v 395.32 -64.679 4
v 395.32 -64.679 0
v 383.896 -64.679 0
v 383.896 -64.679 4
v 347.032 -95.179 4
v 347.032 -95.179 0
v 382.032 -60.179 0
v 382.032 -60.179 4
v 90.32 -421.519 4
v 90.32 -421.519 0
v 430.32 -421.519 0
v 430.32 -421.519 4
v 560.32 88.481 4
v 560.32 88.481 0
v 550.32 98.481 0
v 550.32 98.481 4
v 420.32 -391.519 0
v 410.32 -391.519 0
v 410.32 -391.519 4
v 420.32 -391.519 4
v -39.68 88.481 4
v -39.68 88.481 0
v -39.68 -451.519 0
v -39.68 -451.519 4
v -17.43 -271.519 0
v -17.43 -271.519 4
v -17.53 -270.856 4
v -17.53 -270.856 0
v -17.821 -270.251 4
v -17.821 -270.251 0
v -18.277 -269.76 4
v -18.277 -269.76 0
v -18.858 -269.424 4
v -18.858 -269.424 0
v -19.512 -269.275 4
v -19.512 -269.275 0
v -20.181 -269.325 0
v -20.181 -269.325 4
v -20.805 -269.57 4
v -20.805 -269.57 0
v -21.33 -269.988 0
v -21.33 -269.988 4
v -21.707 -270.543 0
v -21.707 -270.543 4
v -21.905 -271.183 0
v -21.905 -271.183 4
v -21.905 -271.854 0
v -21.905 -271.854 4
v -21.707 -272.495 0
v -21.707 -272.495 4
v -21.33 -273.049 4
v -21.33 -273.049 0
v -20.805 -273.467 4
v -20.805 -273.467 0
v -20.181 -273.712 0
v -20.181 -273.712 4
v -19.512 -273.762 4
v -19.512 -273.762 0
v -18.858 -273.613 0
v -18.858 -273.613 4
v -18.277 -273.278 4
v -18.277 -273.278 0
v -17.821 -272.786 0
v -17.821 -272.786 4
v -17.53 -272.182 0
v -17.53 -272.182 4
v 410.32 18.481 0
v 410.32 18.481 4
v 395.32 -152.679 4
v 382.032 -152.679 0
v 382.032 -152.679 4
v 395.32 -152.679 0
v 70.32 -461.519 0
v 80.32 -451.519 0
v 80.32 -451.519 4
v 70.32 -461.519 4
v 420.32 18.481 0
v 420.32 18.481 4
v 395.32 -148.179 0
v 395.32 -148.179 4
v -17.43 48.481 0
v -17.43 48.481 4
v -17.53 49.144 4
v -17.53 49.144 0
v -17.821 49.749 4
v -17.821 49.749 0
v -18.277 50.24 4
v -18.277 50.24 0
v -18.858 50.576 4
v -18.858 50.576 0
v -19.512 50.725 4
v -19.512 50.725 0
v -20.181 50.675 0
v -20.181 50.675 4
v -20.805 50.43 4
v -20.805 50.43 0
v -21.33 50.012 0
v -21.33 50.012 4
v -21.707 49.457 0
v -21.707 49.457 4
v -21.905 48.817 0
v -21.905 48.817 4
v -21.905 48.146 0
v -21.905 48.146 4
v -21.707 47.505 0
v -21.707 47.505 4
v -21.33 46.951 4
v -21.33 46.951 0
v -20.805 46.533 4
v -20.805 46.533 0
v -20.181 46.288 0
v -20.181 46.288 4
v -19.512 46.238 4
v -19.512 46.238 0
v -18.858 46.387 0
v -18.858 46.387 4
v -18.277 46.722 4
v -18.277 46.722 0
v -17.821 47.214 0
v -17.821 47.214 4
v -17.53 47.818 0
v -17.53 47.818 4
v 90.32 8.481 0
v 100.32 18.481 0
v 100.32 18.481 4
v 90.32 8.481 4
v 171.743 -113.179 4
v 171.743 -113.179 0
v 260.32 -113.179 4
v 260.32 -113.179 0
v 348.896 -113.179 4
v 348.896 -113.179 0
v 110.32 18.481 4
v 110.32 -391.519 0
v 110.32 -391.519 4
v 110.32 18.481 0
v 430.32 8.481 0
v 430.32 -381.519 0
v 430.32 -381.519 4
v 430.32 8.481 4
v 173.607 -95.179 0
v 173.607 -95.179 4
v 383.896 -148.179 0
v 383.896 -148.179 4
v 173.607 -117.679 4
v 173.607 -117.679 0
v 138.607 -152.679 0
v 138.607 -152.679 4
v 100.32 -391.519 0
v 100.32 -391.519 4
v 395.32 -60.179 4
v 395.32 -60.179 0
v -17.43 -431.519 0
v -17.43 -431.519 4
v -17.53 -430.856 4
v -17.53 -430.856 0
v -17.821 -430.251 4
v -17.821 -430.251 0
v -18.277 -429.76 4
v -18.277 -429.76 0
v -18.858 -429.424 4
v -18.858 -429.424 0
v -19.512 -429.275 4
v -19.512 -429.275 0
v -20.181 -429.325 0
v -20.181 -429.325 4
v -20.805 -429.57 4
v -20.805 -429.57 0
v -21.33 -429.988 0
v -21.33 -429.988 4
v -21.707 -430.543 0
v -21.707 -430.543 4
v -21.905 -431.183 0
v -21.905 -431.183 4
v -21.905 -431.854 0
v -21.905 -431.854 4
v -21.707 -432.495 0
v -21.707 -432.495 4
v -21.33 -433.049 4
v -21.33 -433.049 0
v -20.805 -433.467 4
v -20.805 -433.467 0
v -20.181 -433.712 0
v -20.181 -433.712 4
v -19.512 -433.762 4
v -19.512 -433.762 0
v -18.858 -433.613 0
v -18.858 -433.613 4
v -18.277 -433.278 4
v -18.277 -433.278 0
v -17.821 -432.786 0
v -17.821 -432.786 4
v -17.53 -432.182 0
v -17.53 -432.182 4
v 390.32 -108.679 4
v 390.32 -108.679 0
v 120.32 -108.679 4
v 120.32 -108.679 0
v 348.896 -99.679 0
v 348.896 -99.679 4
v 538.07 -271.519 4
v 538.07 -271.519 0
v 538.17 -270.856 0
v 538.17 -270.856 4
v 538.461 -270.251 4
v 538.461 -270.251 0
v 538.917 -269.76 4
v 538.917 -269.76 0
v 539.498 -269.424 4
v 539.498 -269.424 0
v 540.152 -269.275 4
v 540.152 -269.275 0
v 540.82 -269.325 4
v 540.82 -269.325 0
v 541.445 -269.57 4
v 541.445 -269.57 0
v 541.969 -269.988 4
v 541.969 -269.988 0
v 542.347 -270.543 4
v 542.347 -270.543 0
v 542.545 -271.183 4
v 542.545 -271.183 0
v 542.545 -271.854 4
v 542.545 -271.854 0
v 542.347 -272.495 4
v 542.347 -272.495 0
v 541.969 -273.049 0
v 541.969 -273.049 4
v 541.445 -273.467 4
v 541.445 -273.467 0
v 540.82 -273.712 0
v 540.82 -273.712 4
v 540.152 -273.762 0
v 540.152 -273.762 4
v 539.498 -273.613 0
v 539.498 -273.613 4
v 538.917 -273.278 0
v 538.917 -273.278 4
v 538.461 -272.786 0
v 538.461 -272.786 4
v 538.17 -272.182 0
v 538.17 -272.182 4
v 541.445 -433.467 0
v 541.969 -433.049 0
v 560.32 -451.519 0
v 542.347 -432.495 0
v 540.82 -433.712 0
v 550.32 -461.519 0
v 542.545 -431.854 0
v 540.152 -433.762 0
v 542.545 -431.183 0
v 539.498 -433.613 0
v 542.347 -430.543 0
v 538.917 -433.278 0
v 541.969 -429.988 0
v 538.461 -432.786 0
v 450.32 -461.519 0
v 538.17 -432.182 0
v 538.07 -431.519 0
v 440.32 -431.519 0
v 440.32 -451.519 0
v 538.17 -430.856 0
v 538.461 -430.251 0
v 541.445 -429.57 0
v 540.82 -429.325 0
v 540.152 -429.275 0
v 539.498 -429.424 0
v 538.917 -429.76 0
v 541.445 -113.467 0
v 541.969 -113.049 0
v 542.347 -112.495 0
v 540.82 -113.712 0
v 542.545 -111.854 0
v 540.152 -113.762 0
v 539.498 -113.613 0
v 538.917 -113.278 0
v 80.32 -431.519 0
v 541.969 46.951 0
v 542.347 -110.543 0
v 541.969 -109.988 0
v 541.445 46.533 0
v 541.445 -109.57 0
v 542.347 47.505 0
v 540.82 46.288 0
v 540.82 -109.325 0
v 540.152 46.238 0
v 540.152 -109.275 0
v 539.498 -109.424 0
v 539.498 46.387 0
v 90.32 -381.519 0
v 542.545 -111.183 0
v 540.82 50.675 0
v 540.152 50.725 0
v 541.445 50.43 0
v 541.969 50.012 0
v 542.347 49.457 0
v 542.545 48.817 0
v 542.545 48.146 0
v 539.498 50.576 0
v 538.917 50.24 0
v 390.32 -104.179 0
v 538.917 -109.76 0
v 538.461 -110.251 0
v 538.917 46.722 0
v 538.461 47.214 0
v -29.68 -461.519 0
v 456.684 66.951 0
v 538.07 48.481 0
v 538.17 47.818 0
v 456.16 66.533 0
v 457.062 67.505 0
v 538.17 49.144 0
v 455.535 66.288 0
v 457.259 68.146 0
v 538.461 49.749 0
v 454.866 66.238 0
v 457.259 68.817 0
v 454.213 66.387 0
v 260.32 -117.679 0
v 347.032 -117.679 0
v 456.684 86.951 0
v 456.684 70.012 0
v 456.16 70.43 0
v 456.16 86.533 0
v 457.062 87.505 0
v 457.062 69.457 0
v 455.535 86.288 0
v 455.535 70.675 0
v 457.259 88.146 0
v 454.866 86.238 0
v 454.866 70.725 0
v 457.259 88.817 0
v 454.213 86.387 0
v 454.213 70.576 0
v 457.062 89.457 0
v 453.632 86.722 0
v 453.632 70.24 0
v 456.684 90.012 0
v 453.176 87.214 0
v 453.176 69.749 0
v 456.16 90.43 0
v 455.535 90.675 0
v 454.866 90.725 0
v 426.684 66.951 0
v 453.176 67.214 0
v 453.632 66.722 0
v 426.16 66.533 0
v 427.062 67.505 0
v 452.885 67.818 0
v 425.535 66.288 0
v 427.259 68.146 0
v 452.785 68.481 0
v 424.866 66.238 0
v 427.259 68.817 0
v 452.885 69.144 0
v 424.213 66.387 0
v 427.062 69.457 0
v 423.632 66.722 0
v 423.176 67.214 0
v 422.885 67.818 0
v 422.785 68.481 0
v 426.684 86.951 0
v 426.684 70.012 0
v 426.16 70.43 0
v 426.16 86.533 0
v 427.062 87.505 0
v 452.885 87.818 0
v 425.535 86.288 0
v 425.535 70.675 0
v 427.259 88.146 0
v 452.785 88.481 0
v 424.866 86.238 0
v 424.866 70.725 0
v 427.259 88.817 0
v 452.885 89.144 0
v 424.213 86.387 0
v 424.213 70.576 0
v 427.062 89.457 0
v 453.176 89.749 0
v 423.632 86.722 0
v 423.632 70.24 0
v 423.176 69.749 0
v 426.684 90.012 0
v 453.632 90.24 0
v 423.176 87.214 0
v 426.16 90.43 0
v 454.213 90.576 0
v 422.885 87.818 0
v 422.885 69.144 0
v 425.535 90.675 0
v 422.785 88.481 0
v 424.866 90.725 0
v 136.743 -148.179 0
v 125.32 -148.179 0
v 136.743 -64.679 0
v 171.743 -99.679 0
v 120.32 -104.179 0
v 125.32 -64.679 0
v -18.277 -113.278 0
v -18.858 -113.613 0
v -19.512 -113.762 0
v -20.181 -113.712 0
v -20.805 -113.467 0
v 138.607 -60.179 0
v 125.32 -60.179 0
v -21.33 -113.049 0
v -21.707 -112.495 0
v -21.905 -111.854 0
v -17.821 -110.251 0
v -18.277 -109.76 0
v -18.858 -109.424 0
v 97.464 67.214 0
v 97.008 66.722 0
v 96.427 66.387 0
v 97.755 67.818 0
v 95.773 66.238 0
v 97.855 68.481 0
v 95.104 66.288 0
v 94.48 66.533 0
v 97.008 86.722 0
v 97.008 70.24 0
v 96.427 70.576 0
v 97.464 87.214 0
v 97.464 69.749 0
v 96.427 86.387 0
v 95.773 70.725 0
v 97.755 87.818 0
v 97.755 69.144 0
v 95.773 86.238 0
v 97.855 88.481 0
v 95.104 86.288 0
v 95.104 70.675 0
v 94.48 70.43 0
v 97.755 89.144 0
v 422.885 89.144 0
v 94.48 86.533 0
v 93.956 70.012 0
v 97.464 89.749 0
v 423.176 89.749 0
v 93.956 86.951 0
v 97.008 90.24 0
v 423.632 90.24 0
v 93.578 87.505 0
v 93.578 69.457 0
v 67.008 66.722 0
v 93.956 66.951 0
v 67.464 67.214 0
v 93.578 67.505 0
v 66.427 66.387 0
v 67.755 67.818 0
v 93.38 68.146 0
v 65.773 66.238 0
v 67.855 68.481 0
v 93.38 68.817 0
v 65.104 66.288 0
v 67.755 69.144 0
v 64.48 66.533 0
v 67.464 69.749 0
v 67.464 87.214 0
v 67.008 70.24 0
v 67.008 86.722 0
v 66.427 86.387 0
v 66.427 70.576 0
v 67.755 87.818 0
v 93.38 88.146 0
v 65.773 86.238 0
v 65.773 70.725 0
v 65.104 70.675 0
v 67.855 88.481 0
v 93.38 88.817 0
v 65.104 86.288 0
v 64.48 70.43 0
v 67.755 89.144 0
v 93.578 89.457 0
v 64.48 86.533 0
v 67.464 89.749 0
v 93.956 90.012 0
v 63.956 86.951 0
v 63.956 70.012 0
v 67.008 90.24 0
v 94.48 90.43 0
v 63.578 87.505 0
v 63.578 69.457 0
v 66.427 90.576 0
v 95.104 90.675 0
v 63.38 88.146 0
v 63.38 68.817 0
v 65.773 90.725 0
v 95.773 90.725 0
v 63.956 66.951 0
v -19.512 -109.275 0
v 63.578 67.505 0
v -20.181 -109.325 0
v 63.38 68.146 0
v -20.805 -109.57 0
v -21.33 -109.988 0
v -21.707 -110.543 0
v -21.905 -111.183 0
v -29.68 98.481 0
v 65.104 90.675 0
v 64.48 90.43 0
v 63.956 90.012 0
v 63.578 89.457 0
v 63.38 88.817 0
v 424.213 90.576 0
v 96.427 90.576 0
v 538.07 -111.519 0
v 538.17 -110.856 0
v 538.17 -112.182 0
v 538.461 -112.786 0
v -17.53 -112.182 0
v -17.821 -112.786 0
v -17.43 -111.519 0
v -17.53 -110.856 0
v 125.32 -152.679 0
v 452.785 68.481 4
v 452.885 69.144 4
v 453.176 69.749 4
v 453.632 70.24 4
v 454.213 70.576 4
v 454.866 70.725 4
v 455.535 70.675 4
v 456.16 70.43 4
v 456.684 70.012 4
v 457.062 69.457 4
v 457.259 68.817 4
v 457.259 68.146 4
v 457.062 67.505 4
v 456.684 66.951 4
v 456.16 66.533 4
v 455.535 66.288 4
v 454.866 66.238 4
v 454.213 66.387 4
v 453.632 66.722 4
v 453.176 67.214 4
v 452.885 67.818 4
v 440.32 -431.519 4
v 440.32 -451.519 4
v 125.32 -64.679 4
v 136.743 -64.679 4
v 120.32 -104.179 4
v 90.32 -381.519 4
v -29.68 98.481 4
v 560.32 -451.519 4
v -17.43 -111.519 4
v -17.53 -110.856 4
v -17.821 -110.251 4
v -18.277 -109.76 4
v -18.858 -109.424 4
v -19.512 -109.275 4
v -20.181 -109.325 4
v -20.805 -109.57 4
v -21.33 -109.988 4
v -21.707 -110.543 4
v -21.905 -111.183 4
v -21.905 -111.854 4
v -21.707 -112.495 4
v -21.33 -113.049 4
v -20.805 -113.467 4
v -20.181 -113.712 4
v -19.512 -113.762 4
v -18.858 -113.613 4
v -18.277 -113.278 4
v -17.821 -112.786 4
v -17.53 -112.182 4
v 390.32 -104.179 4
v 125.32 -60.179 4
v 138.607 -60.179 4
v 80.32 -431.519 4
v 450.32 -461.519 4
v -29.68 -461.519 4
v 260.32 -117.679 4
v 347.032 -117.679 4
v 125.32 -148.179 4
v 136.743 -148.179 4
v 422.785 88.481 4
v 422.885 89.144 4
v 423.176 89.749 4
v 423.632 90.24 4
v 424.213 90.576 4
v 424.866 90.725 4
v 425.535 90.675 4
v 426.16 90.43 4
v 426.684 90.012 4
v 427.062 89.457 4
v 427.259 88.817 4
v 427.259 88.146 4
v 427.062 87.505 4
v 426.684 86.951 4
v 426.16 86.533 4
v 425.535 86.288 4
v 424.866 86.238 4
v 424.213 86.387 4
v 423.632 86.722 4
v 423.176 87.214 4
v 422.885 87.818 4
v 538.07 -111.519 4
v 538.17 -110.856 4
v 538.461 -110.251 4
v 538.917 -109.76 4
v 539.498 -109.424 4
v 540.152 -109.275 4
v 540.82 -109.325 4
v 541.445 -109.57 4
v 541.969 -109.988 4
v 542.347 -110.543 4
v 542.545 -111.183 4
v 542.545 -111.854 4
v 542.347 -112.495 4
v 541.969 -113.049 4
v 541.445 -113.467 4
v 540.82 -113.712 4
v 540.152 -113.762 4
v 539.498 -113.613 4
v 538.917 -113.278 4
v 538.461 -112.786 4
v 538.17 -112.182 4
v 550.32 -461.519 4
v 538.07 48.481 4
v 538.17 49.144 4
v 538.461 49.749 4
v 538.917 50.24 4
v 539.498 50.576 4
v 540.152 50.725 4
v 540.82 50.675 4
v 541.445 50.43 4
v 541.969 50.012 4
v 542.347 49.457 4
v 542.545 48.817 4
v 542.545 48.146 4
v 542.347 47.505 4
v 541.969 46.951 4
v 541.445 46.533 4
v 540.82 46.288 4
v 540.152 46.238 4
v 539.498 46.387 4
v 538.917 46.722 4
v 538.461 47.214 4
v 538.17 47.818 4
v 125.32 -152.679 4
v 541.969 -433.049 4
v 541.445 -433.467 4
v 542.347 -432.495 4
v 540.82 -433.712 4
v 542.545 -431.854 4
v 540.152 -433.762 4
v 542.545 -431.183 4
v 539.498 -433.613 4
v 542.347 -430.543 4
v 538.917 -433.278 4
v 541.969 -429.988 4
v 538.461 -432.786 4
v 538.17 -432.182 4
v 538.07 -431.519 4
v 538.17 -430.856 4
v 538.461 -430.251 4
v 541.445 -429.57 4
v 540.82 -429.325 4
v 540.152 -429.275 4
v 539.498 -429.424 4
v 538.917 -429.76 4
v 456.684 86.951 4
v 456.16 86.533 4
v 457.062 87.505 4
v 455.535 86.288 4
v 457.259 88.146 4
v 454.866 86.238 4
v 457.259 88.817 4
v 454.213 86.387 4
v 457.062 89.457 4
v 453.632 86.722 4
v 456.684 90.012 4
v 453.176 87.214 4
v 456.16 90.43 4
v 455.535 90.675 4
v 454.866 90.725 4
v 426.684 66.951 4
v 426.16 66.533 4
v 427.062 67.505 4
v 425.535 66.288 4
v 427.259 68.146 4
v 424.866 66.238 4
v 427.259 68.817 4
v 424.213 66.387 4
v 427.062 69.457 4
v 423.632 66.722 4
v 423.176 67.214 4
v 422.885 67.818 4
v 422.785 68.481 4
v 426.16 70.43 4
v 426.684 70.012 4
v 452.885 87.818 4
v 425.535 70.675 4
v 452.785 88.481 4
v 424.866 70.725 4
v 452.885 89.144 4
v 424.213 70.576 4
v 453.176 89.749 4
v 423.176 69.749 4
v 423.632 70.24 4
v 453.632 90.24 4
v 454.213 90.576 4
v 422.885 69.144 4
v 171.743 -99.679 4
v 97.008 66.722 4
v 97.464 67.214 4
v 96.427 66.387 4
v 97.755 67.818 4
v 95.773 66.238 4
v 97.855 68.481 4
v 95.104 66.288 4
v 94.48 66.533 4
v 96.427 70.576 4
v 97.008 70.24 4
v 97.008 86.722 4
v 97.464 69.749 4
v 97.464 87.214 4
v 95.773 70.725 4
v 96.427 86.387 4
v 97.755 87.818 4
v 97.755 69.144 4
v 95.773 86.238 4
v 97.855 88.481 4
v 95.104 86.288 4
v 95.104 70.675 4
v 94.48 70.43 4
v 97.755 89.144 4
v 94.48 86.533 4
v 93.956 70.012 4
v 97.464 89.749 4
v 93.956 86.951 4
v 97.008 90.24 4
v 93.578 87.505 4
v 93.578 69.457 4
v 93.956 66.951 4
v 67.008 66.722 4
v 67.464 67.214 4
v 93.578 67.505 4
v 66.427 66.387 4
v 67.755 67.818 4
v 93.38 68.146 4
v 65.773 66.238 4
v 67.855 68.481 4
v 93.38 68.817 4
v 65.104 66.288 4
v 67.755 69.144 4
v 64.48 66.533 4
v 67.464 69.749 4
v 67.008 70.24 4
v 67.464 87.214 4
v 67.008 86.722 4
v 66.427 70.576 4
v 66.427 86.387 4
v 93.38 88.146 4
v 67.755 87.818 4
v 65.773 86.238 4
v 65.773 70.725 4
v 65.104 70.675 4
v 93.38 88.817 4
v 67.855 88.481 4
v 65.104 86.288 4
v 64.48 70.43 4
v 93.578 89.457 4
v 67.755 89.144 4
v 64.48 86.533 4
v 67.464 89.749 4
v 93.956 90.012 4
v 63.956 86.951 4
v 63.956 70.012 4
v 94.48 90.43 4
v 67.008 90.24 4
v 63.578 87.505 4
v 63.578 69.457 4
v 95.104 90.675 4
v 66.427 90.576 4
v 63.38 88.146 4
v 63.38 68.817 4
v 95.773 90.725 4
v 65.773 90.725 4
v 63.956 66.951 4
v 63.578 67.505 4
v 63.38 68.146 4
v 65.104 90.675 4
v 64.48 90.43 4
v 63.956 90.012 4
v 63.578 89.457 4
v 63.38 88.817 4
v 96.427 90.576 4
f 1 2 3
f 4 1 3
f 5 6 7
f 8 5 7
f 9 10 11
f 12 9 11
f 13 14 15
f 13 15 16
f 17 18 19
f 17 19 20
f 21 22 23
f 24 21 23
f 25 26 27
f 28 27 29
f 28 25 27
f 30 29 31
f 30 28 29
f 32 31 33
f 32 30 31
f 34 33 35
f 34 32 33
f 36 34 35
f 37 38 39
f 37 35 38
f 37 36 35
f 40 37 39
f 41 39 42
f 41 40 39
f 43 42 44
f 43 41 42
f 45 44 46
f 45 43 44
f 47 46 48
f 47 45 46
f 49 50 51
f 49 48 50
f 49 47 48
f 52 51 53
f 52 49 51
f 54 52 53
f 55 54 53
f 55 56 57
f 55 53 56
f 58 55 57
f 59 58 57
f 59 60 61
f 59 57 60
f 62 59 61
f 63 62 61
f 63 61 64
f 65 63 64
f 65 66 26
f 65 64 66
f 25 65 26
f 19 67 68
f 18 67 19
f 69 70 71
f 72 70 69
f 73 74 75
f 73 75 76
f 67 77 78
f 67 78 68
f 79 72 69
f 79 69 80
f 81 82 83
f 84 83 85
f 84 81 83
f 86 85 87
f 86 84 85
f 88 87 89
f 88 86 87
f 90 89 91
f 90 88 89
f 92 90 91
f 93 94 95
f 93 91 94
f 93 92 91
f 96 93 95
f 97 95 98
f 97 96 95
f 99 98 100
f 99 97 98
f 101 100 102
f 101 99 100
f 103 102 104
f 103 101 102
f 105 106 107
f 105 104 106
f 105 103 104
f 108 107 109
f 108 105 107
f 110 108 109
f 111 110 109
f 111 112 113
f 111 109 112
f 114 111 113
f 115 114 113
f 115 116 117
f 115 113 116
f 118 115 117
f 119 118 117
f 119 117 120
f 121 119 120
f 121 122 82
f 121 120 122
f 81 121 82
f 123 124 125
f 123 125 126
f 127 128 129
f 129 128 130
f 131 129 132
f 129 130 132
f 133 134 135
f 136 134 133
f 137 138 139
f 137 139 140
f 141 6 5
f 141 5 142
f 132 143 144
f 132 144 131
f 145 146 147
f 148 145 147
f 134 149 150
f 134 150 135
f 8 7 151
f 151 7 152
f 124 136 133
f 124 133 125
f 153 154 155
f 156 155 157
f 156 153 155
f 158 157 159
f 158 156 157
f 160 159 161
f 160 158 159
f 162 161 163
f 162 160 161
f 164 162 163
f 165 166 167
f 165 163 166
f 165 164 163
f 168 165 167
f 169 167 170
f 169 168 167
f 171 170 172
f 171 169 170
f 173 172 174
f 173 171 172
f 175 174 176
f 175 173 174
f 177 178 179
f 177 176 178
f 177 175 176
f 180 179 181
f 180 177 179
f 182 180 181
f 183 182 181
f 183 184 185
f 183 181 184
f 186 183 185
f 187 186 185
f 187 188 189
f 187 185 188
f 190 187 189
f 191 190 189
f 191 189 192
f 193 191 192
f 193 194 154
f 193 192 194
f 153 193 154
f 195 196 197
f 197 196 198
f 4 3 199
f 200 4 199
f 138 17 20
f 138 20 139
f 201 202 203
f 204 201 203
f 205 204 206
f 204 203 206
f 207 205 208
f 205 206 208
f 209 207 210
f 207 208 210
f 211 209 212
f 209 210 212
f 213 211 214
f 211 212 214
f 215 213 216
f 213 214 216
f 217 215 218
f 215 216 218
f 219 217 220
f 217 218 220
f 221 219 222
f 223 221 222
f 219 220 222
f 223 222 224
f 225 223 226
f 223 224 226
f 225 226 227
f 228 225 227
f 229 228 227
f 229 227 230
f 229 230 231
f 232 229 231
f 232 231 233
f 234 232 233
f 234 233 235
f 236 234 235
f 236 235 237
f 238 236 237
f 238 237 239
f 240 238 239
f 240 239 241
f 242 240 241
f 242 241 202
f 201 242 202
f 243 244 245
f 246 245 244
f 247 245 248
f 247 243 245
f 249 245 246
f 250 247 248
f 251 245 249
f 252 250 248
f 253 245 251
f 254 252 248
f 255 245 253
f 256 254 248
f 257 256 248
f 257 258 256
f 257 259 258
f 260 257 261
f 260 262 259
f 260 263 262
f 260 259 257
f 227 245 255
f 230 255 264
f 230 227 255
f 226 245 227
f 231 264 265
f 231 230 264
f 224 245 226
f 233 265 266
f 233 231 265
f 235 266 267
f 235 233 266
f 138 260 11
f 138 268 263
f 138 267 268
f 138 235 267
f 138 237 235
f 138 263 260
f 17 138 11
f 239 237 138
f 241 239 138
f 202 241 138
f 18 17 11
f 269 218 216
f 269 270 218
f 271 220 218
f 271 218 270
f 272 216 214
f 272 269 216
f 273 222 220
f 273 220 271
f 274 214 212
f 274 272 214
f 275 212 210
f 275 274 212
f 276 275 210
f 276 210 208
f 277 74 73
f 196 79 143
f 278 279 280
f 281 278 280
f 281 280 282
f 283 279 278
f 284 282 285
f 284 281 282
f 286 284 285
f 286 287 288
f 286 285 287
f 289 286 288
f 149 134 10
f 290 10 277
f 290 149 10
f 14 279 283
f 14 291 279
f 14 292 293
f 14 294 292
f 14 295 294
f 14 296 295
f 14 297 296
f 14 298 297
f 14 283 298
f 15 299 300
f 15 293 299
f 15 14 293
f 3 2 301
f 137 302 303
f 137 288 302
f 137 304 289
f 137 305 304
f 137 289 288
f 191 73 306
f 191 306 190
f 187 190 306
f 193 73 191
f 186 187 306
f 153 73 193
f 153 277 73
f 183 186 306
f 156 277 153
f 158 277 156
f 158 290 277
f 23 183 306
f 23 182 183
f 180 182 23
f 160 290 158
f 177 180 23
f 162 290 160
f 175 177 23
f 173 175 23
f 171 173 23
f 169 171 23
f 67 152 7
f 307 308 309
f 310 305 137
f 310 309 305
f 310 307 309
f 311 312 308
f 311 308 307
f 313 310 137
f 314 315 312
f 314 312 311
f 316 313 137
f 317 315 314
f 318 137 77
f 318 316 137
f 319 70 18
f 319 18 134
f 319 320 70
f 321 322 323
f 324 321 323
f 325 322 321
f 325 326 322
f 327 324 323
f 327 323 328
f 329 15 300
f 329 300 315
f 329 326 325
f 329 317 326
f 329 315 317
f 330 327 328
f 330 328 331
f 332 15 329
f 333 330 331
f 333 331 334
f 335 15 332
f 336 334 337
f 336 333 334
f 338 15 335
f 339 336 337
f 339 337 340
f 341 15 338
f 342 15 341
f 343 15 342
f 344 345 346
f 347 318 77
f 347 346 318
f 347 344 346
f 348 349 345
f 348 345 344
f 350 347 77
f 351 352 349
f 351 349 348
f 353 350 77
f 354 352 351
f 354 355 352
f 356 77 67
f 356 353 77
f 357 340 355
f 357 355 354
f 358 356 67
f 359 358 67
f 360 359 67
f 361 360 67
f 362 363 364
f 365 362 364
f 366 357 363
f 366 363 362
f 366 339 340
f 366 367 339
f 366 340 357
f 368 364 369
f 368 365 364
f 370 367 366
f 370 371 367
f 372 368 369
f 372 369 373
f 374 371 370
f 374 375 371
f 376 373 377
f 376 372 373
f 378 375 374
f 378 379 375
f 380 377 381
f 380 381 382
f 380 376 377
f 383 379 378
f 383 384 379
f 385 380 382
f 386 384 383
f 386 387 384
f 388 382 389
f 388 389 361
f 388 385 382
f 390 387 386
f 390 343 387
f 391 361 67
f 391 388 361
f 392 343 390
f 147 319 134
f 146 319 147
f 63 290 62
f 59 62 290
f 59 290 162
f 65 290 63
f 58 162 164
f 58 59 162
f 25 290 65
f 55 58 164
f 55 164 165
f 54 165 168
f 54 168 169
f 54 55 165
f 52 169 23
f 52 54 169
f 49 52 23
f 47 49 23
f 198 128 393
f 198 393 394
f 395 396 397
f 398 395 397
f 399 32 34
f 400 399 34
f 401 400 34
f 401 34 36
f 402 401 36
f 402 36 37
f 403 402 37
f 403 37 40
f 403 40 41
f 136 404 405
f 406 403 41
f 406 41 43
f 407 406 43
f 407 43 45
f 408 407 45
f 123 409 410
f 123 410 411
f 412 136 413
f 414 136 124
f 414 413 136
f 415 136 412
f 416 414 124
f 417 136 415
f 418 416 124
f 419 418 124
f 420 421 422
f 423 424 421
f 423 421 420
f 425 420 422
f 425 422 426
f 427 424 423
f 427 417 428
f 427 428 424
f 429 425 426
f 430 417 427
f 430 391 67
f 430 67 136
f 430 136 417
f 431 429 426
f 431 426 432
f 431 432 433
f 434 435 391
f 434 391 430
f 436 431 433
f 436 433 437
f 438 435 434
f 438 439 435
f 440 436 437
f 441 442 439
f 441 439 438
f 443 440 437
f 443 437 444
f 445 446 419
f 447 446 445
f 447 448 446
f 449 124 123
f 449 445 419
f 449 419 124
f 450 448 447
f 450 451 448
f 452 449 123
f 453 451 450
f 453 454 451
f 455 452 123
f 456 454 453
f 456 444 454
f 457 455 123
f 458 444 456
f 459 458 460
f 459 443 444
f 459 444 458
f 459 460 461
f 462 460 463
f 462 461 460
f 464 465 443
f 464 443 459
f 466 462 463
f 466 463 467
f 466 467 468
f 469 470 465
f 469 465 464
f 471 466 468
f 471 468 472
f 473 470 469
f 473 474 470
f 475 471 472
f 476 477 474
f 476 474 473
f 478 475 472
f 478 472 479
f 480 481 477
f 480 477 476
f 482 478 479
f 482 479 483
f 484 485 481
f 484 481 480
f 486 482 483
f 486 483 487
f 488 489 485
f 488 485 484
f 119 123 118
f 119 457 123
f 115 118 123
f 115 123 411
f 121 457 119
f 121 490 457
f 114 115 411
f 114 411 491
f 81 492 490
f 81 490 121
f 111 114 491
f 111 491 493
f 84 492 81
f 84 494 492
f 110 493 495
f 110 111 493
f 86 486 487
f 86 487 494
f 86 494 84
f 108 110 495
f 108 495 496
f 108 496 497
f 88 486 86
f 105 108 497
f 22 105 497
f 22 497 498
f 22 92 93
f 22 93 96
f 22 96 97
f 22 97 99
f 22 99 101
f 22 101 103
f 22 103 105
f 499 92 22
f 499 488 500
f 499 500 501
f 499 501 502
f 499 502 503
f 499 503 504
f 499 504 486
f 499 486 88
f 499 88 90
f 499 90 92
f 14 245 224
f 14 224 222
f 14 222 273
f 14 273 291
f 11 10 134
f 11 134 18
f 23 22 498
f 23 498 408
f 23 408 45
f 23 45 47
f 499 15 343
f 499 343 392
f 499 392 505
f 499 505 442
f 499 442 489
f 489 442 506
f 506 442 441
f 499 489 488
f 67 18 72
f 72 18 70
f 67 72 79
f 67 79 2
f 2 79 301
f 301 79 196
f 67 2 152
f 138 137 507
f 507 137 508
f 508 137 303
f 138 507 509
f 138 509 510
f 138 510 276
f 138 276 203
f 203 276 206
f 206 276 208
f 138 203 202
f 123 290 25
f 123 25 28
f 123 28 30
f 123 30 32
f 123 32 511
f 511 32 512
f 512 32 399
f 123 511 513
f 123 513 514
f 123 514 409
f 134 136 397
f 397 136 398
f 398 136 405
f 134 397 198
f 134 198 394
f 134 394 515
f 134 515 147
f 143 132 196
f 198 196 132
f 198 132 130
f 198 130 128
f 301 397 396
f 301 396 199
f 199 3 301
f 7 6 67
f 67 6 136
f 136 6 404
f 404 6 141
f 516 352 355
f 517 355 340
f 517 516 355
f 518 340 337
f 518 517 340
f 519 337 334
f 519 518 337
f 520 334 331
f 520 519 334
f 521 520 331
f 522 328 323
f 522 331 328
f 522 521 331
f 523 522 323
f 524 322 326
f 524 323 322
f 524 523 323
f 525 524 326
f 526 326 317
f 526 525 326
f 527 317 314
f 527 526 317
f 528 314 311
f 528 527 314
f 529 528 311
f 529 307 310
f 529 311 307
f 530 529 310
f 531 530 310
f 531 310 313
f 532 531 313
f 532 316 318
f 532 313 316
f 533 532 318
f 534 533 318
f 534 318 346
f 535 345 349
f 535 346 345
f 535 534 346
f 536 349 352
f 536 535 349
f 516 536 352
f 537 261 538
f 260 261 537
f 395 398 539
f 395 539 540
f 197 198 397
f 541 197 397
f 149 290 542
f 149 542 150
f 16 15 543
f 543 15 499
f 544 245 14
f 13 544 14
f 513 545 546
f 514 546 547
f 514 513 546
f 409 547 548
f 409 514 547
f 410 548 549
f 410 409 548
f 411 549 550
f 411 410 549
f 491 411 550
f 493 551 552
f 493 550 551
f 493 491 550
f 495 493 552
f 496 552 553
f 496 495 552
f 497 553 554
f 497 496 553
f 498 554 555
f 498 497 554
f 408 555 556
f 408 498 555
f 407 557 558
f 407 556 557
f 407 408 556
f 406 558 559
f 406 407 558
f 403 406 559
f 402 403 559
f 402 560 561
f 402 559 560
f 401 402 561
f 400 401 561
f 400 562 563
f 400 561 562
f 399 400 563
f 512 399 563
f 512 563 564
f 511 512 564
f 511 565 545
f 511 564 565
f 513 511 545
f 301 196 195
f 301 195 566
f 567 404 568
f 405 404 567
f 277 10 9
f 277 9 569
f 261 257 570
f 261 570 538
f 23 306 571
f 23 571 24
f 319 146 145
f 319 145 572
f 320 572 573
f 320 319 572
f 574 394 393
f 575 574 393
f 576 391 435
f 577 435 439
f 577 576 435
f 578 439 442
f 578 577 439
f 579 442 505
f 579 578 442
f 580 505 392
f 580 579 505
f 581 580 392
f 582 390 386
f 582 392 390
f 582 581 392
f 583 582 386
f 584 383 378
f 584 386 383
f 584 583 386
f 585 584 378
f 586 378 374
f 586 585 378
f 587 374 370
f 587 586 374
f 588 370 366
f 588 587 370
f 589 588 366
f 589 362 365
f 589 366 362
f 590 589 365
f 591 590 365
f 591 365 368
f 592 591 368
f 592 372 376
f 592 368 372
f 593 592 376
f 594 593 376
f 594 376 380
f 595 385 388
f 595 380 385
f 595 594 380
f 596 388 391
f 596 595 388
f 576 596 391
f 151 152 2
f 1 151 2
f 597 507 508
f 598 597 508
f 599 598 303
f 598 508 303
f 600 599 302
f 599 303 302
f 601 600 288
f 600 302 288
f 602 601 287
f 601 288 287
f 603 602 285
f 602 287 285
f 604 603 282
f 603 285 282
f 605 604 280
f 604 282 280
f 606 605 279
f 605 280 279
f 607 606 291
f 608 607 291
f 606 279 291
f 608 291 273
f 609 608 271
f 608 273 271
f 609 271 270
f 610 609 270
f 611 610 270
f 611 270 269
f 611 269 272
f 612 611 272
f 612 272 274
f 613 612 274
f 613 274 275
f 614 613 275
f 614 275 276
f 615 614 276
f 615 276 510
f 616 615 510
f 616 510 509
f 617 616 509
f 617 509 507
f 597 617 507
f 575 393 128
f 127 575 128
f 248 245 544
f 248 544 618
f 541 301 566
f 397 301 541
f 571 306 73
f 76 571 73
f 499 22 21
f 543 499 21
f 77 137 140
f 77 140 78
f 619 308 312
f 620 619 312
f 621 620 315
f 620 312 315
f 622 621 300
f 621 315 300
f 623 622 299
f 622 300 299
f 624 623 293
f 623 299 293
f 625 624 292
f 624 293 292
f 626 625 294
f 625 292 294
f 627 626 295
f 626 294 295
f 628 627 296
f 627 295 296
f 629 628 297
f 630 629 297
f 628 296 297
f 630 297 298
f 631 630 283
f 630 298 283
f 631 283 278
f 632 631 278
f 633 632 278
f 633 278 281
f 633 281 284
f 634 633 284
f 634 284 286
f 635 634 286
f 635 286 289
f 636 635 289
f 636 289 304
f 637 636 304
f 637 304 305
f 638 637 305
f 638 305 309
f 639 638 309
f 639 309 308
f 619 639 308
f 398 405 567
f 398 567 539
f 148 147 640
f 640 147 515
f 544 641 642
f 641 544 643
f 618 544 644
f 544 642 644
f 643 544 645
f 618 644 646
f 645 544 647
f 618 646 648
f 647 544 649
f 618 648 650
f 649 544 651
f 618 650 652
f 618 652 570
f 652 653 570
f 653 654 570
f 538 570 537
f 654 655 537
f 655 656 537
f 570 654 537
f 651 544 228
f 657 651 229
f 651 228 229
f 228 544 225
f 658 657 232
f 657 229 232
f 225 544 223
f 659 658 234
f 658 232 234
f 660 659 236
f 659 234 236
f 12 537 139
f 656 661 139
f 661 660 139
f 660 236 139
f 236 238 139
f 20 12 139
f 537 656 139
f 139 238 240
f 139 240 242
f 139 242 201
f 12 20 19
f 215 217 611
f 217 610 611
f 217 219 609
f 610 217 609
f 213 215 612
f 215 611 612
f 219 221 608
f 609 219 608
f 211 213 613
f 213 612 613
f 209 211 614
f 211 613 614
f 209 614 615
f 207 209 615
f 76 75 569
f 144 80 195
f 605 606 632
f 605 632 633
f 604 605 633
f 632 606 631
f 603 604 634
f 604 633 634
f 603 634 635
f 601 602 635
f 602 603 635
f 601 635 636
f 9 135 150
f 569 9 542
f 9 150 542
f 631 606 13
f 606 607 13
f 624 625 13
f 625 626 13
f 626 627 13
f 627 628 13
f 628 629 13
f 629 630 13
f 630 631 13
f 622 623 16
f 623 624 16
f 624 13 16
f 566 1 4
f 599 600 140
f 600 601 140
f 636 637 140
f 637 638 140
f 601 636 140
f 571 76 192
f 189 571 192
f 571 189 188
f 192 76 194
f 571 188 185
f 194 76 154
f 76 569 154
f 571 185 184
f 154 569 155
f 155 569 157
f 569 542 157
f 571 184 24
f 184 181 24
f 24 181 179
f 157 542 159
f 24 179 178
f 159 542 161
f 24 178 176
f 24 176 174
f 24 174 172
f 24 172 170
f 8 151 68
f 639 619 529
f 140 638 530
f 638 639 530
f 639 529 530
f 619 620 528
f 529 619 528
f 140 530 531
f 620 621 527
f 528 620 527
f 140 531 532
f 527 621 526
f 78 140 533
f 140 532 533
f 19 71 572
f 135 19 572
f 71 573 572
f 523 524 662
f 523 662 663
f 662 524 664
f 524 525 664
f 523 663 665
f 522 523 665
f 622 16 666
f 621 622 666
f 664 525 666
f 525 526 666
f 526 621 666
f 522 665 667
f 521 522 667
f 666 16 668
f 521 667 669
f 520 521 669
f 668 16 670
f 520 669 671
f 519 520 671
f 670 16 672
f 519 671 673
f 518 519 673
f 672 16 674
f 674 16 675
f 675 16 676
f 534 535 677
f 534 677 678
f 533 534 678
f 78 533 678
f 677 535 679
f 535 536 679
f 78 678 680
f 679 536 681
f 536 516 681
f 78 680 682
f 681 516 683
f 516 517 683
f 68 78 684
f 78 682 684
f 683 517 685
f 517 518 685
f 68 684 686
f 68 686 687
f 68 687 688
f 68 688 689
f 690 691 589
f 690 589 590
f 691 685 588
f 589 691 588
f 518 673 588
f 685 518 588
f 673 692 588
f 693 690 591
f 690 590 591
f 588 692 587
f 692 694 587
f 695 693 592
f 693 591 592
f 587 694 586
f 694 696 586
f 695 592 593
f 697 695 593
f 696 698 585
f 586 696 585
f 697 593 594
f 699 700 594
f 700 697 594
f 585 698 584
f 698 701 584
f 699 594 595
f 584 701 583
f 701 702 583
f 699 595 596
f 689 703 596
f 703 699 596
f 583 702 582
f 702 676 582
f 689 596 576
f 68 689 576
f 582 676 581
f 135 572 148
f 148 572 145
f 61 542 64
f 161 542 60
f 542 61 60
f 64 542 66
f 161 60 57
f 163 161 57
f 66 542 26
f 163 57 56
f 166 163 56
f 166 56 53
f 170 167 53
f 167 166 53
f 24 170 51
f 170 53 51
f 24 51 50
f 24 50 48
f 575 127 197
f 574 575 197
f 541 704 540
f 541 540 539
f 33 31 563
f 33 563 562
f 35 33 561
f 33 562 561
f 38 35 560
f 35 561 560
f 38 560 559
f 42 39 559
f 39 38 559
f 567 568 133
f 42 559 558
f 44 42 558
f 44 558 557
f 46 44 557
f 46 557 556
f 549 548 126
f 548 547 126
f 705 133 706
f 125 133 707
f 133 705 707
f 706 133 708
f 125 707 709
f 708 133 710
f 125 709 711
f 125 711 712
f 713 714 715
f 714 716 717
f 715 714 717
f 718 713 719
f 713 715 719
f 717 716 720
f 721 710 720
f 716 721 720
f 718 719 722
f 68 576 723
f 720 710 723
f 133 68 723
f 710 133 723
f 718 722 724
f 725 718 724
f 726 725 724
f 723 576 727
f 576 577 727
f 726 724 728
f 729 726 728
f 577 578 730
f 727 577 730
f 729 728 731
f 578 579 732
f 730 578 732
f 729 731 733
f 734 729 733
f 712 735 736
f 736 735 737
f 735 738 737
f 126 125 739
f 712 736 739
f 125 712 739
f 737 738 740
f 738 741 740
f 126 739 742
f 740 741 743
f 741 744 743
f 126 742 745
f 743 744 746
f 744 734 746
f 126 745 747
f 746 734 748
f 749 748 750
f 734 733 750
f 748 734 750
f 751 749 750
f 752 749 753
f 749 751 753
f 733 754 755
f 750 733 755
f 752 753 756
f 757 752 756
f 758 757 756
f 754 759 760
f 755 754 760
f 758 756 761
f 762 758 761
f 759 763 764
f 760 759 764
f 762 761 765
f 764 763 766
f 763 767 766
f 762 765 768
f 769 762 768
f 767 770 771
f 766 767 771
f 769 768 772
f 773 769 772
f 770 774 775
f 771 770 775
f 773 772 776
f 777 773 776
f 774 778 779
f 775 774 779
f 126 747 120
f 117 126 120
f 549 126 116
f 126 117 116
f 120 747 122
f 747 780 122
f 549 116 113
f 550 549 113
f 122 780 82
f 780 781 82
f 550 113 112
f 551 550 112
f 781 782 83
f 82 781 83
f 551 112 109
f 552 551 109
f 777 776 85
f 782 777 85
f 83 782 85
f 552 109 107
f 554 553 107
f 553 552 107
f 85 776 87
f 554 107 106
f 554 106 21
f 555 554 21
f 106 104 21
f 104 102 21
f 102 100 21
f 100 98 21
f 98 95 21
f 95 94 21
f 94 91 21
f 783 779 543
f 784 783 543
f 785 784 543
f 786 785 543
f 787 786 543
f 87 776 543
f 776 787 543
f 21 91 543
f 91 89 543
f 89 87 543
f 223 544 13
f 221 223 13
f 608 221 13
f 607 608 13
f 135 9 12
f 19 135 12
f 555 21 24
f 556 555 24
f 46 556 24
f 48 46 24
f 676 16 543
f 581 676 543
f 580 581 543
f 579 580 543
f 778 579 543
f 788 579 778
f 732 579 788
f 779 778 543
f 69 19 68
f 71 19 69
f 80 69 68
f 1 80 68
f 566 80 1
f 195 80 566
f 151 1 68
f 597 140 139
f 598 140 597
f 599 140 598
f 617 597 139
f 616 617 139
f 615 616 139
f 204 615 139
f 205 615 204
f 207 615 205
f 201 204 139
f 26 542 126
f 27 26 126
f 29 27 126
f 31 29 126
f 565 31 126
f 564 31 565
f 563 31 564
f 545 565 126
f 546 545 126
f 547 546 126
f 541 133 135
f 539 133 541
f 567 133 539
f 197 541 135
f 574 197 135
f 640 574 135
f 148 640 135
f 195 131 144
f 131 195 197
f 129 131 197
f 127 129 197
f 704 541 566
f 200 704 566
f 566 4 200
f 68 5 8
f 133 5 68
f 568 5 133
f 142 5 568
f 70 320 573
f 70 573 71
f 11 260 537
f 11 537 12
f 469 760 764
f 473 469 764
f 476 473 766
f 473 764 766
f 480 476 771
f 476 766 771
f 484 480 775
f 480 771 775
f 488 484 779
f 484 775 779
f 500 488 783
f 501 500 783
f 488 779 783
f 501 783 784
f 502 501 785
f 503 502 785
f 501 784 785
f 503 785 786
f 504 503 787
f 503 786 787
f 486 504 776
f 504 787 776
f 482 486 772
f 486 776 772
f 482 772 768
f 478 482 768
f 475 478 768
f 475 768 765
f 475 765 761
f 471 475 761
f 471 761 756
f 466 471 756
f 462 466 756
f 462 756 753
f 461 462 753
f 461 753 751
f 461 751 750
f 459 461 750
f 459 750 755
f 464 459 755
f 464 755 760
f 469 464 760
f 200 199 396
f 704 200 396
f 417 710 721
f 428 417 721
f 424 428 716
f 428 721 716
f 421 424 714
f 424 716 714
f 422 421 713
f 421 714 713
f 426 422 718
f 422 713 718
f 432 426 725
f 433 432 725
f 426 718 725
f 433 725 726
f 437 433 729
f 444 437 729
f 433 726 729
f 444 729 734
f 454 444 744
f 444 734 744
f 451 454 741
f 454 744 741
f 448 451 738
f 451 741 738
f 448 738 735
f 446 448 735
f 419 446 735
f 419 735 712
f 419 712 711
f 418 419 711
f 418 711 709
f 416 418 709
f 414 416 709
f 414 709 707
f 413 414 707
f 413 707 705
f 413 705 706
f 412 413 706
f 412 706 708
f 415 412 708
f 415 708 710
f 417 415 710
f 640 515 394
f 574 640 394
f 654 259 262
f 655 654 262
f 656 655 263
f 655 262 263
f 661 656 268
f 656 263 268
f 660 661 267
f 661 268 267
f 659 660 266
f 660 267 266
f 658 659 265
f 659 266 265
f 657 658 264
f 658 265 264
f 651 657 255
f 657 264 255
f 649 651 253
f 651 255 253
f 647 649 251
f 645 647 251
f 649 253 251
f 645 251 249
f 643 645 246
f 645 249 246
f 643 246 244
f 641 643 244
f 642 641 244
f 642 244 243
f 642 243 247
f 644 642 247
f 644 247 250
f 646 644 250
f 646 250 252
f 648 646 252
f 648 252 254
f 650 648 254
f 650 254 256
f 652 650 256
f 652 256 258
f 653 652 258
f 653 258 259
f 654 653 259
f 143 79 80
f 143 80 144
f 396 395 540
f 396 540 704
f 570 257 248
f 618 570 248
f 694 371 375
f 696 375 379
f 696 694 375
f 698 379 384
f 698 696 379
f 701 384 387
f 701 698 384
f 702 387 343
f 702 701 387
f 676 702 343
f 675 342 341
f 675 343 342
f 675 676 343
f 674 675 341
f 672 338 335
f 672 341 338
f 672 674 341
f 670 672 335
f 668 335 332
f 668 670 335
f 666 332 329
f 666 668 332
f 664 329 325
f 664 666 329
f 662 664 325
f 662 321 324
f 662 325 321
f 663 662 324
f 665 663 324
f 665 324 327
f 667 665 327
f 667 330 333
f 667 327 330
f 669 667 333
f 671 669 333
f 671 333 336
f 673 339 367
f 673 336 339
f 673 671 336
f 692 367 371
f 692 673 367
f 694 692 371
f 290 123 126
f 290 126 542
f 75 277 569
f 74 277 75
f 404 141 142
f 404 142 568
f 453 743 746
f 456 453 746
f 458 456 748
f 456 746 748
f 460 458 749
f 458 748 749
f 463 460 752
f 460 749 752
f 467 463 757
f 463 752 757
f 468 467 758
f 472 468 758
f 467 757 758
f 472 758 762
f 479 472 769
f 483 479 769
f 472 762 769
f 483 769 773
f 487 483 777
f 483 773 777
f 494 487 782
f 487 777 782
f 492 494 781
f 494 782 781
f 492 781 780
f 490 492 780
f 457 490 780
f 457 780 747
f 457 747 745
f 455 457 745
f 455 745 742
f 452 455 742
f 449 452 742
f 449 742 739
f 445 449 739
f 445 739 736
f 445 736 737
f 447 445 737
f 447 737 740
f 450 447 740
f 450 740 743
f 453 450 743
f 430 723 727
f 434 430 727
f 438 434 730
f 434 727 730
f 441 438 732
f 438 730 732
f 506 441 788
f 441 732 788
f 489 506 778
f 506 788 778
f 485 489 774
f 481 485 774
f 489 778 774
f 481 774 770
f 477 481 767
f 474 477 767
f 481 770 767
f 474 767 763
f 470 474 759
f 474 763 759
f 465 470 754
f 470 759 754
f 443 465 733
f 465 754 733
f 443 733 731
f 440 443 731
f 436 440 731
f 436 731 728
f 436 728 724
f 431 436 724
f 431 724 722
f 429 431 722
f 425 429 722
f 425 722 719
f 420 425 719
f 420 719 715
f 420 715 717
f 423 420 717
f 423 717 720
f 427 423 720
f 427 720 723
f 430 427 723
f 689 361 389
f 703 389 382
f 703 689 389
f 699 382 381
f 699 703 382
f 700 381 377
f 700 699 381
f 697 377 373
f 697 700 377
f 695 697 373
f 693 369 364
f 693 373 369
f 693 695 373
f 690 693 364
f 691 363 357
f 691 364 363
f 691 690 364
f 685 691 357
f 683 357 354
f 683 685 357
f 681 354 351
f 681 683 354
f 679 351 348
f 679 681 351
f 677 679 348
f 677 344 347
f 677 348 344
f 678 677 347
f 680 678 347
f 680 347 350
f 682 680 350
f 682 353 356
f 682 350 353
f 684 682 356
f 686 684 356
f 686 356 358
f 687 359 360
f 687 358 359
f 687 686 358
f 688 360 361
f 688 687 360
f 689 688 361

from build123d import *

# Parameters (mm, degrees)
BOSS_EXTRUDE1_DEPTH  = 4
CUT_EXTRUDE2_DEPTH   = 10
SKETCH4_W            = 270
SKETCH4_H            = 4.5
CUT_EXTRUDE5_DEPTH   = 10
CUT_EXTRUDE6_DEPTH   = 10
MIRROR9_COPY_1_DEPTH = 10
CHAMFER1_SIZE        = 10
SKETCH6_R            = 2.25
CUT_EXTRUDE7_DEPTH   = 10
SKETCH7_R            = 2.25
CUT_EXTRUDE8_DEPTH   = 10


with BuildPart() as part:
    # Sketch1 → Boss-Extrude1 (new body)
    with BuildSketch(Plane.XY):
        Polygon((440.319741737, -451.518776284), (440.319741737, -431.518776284), (430.319741737, -421.518776284), (310.319741737, -421.518776284), (210.319741737, -421.518776284), (90.319741737, -421.518776284), (80.319741737, -431.518776284), (80.319741737, -451.518776284), (70.319741737, -461.518776284), (2.319741737, -461.518776284), (-29.680258263, -461.518776284), (-39.680258263, -451.518776284), (-39.680258263, -421.518776284), (-39.680258263, -5.004819249), (-39.680258263, 98.481223716), (0.319741737, 98.481223716), (540.319741737, 98.481223716), (560.319741737, 98.481223716), (560.319741737, -5.004819249), (560.319741737, -420.004819249), (560.319741737, -451.518776284), (550.319741737, -461.518776284), (540.319741737, -461.518776284), (450.319741737, -461.518776284), align=None)
    extrude(amount=BOSS_EXTRUDE1_DEPTH)

    # Sketch3 → Cut-Extrude2 (cut)
    with BuildSketch(Plane(origin=(0, 0, 0), x_dir=(-1, 0, 0), z_dir=(0, 0, -1))):
        Polygon((-410.319741737, -391.518776284), (-420.319741737, -391.518776284), (-430.319741737, -381.518776284), (-430.319741737, 8.481223716), (-420.319741737, 18.481223716), (-410.319741737, 18.481223716), align=None)
        Polygon((-100.319741737, 18.481223716), (-90.319741737, 8.481223716), (-90.319741737, -381.518776284), (-100.319741737, -391.518776284), (-110.319741737, -391.518776284), (-110.319741737, 18.481223716), align=None)
    extrude(amount=-CUT_EXTRUDE2_DEPTH, mode=Mode.SUBTRACT)

    # Sketch4 → Cut-Extrude5 (cut)
    with BuildSketch(Plane(origin=(0, 0, 0), x_dir=(-1, 0, 0), z_dir=(0, 0, -1))):
        with Locations((-255.319741737, -106.429112329)):
            Rectangle(SKETCH4_W, SKETCH4_H)
    extrude(amount=-CUT_EXTRUDE5_DEPTH, mode=Mode.SUBTRACT)

    # Sketch5 → Cut-Extrude6 (cut)
    with BuildSketch(Plane(origin=(0, 0, 0), x_dir=(-1, 0, 0), z_dir=(0, 0, -1))):
        Polygon((-171.743467553, -99.679112329), (-260.319741737, -99.679112329), (-260.319741737, -95.179112329), (-173.607428584, -95.179112329), (-138.607428584, -60.179112329), (-125.319741737, -60.179112329), (-125.319741737, -64.679112329), (-136.743467553, -64.679112329), align=None)
    cut_extrude6 = extrude(amount=-CUT_EXTRUDE6_DEPTH, mode=Mode.SUBTRACT)

    # Mirror3: Cut-Extrude6 across plane
    add(cut_extrude6.mirror(Plane(origin=(260.319741737, -99.679112329, 10), x_dir=(0, 0, 1), z_dir=(1, 0, 0))), mode=Mode.SUBTRACT)

    # Mirror9: Cut-Extrude6 across plane
    add(cut_extrude6.mirror(Plane(origin=(0, -106.429112329, 0), x_dir=(0, 0, 1), z_dir=(0, -1, 0))), mode=Mode.SUBTRACT)

    # Mirror9 copy 1 sketch → Mirror9 copy 1 (cut)
    with BuildSketch(Plane(origin=(520.639483474, -212.858224657, 0), x_dir=(1, 0, 0), z_dir=(0, 0, -1))):
        Polygon((-171.743467553, -99.679112329), (-260.319741737, -99.679112329), (-260.319741737, -95.179112329), (-173.607428584, -95.179112329), (-138.607428584, -60.179112329), (-125.319741737, -60.179112329), (-125.319741737, -64.679112329), (-136.743467553, -64.679112329), align=None)
    extrude(amount=-MIRROR9_COPY_1_DEPTH, mode=Mode.SUBTRACT)

    # Chamfer1
    chamfer1_edges = [part.edges().sort_by_distance(p)[0] for p in [
        (-39.680258263, 98.481223716, 2),
        (560.319741737, 98.481223716, 2),
    ]]
    chamfer(chamfer1_edges, length=CHAMFER1_SIZE)

    # Sketch6 → Cut-Extrude7 (cut)
    with BuildSketch(Plane(origin=(0, 0, 0), x_dir=(-1, 0, 0), z_dir=(0, 0, -1))):
        with Locations((-540.319741737, 48.481223716)):
            Circle(SKETCH6_R)
        with Locations((-540.319741737, -111.518776284)):
            Circle(SKETCH6_R)
        with Locations((-540.319741737, -271.518776284)):
            Circle(SKETCH6_R)
        with Locations((-540.319741737, -431.518776284)):
            Circle(SKETCH6_R)
    cut_extrude7 = extrude(amount=-CUT_EXTRUDE7_DEPTH, mode=Mode.SUBTRACT)

    # Mirror10: Cut-Extrude7 across plane
    add(cut_extrude7.mirror(Plane(origin=(260.319741737, 0, 0), x_dir=(0, 0, 1), z_dir=(1, 0, 0))), mode=Mode.SUBTRACT)

    # Sketch7 → Cut-Extrude8 (cut)
    with BuildSketch(Plane.XY.offset(4)):
        with Locations((65.604902337, 88.481223716)):
            Circle(SKETCH7_R)
        with Locations((95.604902337, 88.481223716)):
            Circle(SKETCH7_R)
        with Locations((95.604902337, 68.481223716)):
            Circle(SKETCH7_R)
        with Locations((65.604902337, 68.481223716)):
            Circle(SKETCH7_R)
    cut_extrude8 = extrude(amount=-CUT_EXTRUDE8_DEPTH, mode=Mode.SUBTRACT)

    # Mirror11: Cut-Extrude8 across plane
    add(cut_extrude8.mirror(Plane(origin=(260.319741737, 0, 0), x_dir=(0, 0, 1), z_dir=(1, 0, 0))), mode=Mode.SUBTRACT)


solid = part.part
